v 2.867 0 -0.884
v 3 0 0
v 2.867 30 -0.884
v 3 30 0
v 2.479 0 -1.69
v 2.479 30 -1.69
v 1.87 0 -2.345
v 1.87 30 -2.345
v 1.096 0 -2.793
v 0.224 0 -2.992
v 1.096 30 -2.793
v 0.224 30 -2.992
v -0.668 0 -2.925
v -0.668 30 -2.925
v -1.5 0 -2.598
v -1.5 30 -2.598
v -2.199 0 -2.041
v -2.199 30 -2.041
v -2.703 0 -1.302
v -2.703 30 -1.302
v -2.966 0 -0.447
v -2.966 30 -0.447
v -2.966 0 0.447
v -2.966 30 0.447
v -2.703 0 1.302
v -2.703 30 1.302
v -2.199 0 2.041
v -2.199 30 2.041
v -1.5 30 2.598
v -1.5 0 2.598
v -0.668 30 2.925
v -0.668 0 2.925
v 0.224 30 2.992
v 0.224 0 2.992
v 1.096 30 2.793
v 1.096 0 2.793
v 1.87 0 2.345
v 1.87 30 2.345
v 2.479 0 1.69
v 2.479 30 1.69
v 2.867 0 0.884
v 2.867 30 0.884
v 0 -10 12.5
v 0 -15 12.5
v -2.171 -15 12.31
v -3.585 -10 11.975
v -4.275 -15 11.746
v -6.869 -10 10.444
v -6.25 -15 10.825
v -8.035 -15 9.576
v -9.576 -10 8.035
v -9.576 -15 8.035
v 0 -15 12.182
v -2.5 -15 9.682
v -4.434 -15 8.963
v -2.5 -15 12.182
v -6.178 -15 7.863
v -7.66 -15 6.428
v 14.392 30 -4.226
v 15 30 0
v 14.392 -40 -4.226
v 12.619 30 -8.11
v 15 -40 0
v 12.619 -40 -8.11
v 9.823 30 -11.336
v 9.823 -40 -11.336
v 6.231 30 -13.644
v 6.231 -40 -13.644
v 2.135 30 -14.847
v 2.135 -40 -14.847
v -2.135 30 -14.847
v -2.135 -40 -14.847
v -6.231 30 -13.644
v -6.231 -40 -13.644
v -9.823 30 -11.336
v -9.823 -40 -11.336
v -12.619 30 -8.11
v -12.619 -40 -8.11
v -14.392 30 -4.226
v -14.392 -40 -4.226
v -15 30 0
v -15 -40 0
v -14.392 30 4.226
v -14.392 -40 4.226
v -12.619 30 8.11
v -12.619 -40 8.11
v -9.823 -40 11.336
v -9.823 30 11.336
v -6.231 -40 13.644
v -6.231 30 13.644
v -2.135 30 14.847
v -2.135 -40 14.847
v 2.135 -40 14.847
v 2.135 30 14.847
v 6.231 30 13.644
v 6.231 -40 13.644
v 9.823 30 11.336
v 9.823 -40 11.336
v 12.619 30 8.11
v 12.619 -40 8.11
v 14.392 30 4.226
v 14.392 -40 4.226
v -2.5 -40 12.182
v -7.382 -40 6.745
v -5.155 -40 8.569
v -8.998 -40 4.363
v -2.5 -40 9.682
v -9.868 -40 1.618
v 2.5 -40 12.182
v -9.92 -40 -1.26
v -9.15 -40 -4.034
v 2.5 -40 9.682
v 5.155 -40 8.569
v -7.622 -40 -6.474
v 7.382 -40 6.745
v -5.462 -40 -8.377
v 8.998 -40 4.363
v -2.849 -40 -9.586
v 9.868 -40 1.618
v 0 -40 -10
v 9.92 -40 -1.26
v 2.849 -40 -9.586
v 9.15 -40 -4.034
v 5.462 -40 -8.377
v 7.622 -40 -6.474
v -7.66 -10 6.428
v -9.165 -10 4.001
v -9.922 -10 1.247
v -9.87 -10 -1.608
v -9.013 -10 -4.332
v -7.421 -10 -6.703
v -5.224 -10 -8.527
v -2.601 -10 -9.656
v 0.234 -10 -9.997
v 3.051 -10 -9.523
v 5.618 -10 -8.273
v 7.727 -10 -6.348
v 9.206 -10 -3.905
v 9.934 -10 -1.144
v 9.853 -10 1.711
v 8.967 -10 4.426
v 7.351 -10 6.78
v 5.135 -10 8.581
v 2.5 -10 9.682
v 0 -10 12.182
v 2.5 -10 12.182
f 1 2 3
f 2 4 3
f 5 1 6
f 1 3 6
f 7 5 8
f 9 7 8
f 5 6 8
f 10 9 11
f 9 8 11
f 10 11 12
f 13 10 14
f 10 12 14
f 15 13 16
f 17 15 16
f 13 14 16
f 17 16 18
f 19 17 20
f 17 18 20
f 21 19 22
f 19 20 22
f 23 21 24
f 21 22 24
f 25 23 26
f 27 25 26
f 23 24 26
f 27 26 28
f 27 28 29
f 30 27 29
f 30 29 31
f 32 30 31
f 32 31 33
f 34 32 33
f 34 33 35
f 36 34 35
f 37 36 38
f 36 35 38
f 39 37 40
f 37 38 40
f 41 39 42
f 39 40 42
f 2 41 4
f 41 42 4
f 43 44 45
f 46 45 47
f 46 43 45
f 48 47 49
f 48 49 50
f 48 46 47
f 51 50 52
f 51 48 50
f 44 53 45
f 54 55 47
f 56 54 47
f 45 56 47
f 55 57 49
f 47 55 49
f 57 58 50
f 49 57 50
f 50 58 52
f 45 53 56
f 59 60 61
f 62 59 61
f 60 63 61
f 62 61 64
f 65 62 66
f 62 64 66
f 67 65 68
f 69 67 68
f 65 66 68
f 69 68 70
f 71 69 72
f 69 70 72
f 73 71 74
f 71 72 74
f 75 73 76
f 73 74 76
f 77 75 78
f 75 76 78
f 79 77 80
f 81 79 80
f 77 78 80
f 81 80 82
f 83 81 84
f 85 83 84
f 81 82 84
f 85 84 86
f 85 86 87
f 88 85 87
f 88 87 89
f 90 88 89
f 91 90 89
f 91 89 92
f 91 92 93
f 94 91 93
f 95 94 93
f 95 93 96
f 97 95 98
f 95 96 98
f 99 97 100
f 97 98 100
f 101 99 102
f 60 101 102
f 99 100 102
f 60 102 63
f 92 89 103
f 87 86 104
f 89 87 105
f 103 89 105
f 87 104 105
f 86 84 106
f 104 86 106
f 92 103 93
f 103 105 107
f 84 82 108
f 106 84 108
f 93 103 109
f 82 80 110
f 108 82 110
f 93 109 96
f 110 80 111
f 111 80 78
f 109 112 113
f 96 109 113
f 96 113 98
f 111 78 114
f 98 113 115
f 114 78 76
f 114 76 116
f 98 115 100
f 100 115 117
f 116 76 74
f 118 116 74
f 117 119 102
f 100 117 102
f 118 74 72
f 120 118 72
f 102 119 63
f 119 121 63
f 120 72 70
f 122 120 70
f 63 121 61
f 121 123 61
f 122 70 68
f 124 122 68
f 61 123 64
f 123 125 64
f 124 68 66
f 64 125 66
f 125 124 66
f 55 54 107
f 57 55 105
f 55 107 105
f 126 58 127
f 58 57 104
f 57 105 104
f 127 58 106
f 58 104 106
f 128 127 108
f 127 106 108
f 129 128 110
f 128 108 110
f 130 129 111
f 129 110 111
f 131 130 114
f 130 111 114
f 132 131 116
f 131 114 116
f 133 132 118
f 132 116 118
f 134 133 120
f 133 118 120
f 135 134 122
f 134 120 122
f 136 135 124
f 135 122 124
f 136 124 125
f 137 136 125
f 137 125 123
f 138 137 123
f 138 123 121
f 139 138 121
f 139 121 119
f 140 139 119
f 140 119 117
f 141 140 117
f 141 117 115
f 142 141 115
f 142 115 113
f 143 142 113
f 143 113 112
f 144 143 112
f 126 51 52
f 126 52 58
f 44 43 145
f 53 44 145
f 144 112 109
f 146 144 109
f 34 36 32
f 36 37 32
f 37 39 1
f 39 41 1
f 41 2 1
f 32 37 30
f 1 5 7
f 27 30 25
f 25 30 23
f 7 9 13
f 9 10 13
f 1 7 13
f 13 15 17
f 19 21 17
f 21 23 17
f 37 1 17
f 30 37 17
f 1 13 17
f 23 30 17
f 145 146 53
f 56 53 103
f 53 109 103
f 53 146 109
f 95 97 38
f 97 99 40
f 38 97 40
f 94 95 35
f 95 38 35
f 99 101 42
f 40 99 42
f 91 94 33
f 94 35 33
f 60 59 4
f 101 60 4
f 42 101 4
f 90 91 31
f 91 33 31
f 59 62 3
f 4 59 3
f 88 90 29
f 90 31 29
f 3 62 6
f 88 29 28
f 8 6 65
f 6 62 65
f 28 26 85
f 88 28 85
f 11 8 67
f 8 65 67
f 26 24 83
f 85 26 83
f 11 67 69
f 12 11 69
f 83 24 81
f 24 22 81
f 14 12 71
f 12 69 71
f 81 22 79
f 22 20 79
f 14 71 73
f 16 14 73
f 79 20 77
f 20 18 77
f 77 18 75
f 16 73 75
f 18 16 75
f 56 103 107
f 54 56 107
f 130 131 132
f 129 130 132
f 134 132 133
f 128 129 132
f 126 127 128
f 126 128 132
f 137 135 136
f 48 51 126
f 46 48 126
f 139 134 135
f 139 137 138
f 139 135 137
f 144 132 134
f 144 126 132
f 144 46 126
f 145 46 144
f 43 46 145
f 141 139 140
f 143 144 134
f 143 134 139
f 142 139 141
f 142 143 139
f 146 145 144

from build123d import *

# Parameters (mm, degrees)
CUT_EXTRUDE2_DEPTH = 30
SKETCH6_W          = 2.5
SKETCH6_H          = 5
CUT_REVOLVE1_ANGLE = 50


with BuildPart() as part:
    # Sketch1 → Revolve1 (revolve)
    with BuildSketch(Plane.XY):
        Polygon((3, 30), (15, 30), (15, -40), (0, -40), (0, 0), (3, 0), align=None)
    revolve(axis=Axis((0, -40, 0), (0, 1, 0)))

    # Sketch3 → Cut-Extrude2 (cut)
    with BuildSketch(Plane.XZ.offset(40)):
        with BuildLine():
            Line((-2.5, 12.182458366), (-2.5, 9.682458366))
            ThreePointArc((-2.5, 9.682458366), (0, -10), (2.5, 9.682458366))
            Line((2.5, 9.682458366), (2.5, 12.182458366))
            Line((2.5, 12.182458366), (-2.5, 12.182458366))
        make_face()
    extrude(amount=-CUT_EXTRUDE2_DEPTH, mode=Mode.SUBTRACT)

    # Sketch6 → Cut-Revolve1 (revolve, cut)
    with BuildSketch(Plane(origin=(0, 0, 0), x_dir=(0, 0, -1), z_dir=(1, 0, 0))):
        with Locations((-11.25, -12.5)):
            Rectangle(SKETCH6_W, SKETCH6_H)
    revolve(axis=Axis((0, 0, 0), (0, -1, 0)), revolution_arc=CUT_REVOLVE1_ANGLE, mode=Mode.SUBTRACT)


solid = part.part
